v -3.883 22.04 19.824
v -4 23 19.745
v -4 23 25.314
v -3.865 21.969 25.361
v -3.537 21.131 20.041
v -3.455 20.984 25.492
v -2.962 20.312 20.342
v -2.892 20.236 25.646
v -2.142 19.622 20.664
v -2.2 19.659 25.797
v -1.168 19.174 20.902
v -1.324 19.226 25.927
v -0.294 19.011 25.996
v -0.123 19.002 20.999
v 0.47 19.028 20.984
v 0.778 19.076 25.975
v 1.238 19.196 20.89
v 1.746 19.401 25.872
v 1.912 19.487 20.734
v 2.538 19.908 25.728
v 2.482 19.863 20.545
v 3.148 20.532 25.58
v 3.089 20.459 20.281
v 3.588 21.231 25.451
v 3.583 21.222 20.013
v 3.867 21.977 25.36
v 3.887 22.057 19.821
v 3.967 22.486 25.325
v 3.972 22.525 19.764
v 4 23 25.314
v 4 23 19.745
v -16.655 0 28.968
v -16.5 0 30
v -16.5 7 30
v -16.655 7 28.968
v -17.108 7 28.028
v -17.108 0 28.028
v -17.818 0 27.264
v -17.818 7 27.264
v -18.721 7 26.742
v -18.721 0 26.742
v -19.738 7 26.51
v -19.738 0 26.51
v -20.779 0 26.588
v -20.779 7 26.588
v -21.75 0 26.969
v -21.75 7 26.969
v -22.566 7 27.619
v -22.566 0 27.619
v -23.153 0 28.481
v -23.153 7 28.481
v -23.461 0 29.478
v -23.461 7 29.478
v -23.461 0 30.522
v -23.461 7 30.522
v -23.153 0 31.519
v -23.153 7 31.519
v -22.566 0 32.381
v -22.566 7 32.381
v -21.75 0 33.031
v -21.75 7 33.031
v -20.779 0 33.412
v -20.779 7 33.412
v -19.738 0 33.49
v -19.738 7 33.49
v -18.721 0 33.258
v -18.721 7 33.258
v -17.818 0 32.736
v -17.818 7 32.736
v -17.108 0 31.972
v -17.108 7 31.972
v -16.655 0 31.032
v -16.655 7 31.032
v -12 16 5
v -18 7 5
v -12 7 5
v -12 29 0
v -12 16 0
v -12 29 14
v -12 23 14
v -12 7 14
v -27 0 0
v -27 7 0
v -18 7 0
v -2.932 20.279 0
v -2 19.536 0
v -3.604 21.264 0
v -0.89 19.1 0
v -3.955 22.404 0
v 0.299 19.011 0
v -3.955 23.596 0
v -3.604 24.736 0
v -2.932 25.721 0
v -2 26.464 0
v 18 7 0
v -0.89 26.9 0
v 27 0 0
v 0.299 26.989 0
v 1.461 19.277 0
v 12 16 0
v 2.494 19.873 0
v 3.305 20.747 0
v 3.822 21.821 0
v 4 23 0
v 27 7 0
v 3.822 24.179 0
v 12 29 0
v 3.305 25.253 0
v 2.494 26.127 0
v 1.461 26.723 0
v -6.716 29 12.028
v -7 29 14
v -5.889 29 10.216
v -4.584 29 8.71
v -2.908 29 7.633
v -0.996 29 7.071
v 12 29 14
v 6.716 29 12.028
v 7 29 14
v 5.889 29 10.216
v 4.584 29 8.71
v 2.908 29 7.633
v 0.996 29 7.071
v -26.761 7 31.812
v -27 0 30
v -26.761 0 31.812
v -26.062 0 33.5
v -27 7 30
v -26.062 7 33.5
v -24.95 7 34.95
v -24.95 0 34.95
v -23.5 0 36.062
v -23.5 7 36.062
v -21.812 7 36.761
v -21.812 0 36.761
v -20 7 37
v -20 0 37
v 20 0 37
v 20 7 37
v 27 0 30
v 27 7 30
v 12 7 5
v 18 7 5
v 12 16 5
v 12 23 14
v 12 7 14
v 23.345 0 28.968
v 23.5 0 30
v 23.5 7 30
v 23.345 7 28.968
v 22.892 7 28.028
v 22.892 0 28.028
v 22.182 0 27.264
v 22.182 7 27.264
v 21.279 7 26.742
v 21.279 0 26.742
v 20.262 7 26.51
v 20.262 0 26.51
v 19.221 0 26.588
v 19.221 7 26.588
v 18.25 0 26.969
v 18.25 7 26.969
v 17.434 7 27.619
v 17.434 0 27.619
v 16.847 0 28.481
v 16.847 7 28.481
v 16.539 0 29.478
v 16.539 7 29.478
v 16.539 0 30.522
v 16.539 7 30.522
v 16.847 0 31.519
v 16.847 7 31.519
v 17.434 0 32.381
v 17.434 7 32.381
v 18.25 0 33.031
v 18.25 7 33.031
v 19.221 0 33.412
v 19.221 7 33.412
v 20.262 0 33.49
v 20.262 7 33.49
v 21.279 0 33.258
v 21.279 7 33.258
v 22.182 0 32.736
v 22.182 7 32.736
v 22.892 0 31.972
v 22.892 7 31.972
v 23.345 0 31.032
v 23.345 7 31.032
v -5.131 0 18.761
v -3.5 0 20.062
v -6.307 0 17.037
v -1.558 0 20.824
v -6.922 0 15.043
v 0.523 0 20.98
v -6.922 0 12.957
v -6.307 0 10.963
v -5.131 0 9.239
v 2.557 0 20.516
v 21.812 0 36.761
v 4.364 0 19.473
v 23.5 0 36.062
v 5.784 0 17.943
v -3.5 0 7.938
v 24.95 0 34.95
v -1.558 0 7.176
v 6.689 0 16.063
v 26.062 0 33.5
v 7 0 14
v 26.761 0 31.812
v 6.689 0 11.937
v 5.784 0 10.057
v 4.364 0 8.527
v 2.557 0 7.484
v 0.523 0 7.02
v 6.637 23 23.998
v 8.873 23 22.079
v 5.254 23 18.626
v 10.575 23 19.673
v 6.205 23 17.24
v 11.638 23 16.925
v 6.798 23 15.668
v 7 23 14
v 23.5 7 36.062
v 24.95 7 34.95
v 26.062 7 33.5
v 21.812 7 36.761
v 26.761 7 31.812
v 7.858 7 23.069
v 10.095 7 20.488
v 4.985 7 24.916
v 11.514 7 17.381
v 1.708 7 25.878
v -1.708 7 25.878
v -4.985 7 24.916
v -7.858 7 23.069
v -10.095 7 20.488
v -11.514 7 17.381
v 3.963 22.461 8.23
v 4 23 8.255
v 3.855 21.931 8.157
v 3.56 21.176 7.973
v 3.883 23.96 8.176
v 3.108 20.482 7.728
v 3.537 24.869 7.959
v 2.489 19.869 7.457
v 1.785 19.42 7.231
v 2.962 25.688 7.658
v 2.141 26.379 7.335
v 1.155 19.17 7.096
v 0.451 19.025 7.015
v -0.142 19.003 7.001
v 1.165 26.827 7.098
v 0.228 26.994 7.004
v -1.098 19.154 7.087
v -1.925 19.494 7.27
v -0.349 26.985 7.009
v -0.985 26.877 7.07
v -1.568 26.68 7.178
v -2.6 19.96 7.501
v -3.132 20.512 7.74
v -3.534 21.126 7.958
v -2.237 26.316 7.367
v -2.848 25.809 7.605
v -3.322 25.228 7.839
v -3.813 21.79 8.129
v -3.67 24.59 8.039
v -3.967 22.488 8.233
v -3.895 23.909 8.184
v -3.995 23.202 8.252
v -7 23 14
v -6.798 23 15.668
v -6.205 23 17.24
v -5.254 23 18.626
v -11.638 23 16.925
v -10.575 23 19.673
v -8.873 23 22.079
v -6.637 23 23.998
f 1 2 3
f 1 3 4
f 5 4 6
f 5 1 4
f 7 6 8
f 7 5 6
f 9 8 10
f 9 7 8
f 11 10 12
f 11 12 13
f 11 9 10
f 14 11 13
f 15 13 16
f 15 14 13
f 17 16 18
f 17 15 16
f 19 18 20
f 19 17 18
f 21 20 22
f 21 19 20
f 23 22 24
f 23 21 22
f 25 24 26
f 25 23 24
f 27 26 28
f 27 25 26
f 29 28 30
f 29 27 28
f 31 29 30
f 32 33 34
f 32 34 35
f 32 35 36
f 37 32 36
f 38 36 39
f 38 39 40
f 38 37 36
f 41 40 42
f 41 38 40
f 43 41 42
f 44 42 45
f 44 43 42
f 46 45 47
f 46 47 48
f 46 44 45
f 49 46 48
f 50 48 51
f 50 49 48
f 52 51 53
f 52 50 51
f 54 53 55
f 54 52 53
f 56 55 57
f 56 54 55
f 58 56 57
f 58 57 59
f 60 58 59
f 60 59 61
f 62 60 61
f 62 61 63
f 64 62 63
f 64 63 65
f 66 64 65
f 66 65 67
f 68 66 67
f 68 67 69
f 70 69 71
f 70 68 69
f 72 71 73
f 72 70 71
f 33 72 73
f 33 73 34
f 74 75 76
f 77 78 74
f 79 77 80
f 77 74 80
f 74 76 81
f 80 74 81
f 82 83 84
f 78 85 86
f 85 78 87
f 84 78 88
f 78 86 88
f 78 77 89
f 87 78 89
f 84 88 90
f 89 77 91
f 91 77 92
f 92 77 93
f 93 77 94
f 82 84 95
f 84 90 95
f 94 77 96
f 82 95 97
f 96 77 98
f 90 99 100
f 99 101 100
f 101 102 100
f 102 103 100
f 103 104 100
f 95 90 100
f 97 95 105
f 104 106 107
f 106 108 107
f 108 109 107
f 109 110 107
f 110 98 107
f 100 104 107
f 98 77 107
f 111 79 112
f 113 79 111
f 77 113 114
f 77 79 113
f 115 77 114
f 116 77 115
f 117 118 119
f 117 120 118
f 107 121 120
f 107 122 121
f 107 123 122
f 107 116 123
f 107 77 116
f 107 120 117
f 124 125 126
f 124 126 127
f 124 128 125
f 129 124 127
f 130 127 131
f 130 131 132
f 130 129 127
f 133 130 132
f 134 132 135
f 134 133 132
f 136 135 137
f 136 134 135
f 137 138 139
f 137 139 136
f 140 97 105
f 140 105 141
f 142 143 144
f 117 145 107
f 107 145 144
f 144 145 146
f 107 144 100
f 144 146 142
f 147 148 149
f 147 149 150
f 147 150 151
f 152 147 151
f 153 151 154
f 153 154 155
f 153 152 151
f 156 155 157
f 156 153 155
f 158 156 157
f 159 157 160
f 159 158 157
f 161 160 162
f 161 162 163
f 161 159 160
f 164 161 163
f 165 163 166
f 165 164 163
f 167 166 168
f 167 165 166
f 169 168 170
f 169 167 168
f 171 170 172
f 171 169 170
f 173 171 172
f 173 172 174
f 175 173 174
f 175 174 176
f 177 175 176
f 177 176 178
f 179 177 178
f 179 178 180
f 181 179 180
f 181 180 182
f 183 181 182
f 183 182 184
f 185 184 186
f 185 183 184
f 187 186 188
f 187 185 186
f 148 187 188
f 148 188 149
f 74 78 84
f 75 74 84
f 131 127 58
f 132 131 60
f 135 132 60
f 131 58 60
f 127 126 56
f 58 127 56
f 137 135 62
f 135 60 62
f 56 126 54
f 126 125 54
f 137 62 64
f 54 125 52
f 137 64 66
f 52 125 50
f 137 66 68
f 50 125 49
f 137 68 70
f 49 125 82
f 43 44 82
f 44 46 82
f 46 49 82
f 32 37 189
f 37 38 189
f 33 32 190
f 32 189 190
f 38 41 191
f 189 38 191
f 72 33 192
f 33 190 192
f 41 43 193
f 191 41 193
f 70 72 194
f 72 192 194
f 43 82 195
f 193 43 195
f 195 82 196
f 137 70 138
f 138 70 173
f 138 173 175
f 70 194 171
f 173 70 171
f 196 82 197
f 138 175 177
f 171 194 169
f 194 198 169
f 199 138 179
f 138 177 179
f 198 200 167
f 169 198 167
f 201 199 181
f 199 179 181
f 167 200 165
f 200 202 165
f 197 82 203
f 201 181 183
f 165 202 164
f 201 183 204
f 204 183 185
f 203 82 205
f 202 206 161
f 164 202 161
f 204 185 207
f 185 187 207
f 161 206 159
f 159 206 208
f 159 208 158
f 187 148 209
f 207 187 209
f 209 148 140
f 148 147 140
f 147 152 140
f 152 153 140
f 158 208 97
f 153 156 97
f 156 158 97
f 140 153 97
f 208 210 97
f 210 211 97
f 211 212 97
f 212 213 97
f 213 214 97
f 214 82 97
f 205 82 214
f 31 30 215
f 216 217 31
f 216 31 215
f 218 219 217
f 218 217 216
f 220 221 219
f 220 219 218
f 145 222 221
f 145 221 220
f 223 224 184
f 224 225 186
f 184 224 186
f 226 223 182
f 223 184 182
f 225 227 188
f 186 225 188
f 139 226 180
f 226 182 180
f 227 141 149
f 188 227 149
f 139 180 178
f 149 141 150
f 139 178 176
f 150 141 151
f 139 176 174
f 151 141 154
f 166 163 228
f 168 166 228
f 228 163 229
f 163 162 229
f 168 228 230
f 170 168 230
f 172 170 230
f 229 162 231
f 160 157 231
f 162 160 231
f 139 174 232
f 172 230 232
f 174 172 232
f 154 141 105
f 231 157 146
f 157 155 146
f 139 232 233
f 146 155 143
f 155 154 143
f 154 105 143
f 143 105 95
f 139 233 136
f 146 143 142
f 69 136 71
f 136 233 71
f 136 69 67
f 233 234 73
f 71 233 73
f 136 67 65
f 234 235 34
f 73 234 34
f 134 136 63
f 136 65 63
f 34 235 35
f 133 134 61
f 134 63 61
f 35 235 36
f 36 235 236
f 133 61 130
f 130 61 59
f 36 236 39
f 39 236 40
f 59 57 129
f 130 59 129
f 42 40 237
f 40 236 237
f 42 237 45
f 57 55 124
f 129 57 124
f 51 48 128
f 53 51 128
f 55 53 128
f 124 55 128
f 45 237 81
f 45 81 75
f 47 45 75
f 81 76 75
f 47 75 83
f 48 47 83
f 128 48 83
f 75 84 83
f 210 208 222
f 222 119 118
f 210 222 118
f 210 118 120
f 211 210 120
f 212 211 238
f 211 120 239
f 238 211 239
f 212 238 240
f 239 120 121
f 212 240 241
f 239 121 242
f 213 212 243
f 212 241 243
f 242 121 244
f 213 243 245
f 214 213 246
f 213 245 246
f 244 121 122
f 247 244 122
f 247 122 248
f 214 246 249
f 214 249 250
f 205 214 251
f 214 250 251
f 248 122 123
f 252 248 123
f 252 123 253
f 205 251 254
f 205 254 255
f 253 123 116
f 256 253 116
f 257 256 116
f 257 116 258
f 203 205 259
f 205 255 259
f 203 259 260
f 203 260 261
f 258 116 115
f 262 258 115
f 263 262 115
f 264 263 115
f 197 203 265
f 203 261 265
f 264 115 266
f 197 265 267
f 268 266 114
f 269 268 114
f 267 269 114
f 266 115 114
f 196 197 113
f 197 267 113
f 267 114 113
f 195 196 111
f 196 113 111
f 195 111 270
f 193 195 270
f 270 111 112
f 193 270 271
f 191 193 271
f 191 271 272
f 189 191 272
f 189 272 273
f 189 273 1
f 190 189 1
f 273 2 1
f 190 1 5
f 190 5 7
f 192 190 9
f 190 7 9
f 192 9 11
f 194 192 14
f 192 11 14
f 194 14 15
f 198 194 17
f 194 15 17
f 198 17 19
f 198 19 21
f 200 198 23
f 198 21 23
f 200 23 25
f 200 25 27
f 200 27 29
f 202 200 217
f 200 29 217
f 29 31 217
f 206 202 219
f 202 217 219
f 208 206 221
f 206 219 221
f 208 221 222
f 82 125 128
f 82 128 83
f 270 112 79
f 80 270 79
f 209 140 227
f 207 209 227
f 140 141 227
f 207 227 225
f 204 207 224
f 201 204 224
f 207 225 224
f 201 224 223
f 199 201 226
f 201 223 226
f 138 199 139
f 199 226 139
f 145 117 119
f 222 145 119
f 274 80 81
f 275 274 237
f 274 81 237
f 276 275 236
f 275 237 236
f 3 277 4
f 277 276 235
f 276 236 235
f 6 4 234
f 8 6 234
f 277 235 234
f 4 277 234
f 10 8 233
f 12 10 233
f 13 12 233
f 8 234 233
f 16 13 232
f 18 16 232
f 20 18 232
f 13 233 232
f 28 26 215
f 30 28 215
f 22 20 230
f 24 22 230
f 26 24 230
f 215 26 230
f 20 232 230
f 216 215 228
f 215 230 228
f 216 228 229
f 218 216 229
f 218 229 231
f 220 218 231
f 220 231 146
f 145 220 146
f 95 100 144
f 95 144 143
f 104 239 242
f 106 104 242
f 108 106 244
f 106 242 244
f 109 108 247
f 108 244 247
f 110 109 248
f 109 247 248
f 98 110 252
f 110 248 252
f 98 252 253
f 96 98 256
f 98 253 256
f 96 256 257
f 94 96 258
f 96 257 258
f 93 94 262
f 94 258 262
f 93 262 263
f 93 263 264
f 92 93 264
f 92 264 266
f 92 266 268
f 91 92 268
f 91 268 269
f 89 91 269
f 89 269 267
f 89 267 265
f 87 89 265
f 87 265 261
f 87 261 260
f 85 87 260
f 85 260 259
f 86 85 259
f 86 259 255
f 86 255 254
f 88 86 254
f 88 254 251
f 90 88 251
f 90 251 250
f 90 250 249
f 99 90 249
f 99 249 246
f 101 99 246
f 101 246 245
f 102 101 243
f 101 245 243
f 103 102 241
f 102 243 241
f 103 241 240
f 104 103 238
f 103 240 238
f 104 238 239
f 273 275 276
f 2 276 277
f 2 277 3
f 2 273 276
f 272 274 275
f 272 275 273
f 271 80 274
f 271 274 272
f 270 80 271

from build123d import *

# Parameters (mm, degrees)
EXTRUDE_1_DEPTH          = 7
SKETCH_2_R               = 3.5
CUT_EXTRUDE_2_DEPTH      = 7
FILLET_1_R               = 7
EXTRUDE_2_DEPTH          = 29
SKETCH_4_R               = 7
CUT_EXTRUDE_3_DEPTH      = 30
CUT_EXTRUDE_4_DEPTH      = 6
SKETCH_6_R               = 4
CUT_EXTRUDE_5_DEPTH      = 17
CUT_EXTRUDE_5_DEPTH_BACK = 15
EXTRUDE_3_DEPTH          = 5


with BuildPart() as part:
    # 草图1 → 凸台-拉伸1 (new body)
    with BuildSketch(Plane(origin=(0, 0, 0), x_dir=(1, 0, 0), z_dir=(0, 1, 0))):
        Polygon((0, 0), (27, 0), (27, -37), (-27, -37), (-27, 0), align=None)
    extrude(amount=EXTRUDE_1_DEPTH)

    # 草图2 → 切除-拉伸2 (cut)
    with BuildSketch(Plane(origin=(0, 0, 0), x_dir=(1, 0, 0), z_dir=(0, 1, 0))):
        with Locations((-20, -30)):
            Circle(SKETCH_2_R)
        with Locations((20, -30)):
            Circle(SKETCH_2_R)
    extrude(amount=CUT_EXTRUDE_2_DEPTH, mode=Mode.SUBTRACT)

    # 圆角1
    fillet_1_edges = [part.edges().sort_by_distance(p)[0] for p in [
        (27, 3.5, 37),
        (-27, 3.5, 37),
    ]]
    fillet(fillet_1_edges, radius=FILLET_1_R)

    # 草图3 → 凸台-拉伸2 (add)
    with BuildSketch(Plane(origin=(0, 0, 0), x_dir=(1, 0, 0), z_dir=(0, 1, 0))):
        with BuildLine():
            Line((0, 0), (-12, 0))
            Line((-12, 0), (-12, -14))
            ThreePointArc((-12, -14), (0, -26), (12, -14))
            Line((12, -14), (12, 0))
            Line((12, 0), (0, 0))
        make_face()
    extrude(amount=EXTRUDE_2_DEPTH)

    # 草图4 → 切除-拉伸3 (cut, through all)
    with BuildSketch(Plane(origin=(0, 29, 0), x_dir=(1, 0, 0), z_dir=(0, 1, 0))):
        with Locations((0, -14)):
            Circle(SKETCH_4_R)
    extrude(amount=-CUT_EXTRUDE_3_DEPTH, mode=Mode.SUBTRACT)

    # 草图5 → 切除-拉伸4 (cut)
    with BuildSketch(Plane(origin=(0, 29, 0), x_dir=(1, 0, 0), z_dir=(0, 1, 0))):
        with BuildLine():
            Line((-7, -14), (-12, -14))
            ThreePointArc((-12, -14), (0, -26), (12, -14))
            Line((12, -14), (7, -14))
            ThreePointArc((7, -14), (0, -21), (-7, -14))
        make_face()
    extrude(amount=-CUT_EXTRUDE_4_DEPTH, mode=Mode.SUBTRACT)

    # 草图6 → 切除-拉伸5 (cut, two sides)
    with BuildSketch(Plane.XY.offset(14)) as cut_extrude_5_sk:
        with Locations((0, 23)):
            Circle(SKETCH_6_R)
    extrude(amount=CUT_EXTRUDE_5_DEPTH, mode=Mode.SUBTRACT)
    extrude(cut_extrude_5_sk.sketch, amount=-CUT_EXTRUDE_5_DEPTH_BACK, mode=Mode.SUBTRACT)

    # 草图8 → 凸台-拉伸3 (add)
    with BuildSketch(Plane.XY):
        Polygon((-12, 16), (-18, 7), (-12, 7), align=None)
        Polygon((12, 7), (12, 16), (18, 7), align=None)
    extrude(amount=EXTRUDE_3_DEPTH)


solid = part.part
